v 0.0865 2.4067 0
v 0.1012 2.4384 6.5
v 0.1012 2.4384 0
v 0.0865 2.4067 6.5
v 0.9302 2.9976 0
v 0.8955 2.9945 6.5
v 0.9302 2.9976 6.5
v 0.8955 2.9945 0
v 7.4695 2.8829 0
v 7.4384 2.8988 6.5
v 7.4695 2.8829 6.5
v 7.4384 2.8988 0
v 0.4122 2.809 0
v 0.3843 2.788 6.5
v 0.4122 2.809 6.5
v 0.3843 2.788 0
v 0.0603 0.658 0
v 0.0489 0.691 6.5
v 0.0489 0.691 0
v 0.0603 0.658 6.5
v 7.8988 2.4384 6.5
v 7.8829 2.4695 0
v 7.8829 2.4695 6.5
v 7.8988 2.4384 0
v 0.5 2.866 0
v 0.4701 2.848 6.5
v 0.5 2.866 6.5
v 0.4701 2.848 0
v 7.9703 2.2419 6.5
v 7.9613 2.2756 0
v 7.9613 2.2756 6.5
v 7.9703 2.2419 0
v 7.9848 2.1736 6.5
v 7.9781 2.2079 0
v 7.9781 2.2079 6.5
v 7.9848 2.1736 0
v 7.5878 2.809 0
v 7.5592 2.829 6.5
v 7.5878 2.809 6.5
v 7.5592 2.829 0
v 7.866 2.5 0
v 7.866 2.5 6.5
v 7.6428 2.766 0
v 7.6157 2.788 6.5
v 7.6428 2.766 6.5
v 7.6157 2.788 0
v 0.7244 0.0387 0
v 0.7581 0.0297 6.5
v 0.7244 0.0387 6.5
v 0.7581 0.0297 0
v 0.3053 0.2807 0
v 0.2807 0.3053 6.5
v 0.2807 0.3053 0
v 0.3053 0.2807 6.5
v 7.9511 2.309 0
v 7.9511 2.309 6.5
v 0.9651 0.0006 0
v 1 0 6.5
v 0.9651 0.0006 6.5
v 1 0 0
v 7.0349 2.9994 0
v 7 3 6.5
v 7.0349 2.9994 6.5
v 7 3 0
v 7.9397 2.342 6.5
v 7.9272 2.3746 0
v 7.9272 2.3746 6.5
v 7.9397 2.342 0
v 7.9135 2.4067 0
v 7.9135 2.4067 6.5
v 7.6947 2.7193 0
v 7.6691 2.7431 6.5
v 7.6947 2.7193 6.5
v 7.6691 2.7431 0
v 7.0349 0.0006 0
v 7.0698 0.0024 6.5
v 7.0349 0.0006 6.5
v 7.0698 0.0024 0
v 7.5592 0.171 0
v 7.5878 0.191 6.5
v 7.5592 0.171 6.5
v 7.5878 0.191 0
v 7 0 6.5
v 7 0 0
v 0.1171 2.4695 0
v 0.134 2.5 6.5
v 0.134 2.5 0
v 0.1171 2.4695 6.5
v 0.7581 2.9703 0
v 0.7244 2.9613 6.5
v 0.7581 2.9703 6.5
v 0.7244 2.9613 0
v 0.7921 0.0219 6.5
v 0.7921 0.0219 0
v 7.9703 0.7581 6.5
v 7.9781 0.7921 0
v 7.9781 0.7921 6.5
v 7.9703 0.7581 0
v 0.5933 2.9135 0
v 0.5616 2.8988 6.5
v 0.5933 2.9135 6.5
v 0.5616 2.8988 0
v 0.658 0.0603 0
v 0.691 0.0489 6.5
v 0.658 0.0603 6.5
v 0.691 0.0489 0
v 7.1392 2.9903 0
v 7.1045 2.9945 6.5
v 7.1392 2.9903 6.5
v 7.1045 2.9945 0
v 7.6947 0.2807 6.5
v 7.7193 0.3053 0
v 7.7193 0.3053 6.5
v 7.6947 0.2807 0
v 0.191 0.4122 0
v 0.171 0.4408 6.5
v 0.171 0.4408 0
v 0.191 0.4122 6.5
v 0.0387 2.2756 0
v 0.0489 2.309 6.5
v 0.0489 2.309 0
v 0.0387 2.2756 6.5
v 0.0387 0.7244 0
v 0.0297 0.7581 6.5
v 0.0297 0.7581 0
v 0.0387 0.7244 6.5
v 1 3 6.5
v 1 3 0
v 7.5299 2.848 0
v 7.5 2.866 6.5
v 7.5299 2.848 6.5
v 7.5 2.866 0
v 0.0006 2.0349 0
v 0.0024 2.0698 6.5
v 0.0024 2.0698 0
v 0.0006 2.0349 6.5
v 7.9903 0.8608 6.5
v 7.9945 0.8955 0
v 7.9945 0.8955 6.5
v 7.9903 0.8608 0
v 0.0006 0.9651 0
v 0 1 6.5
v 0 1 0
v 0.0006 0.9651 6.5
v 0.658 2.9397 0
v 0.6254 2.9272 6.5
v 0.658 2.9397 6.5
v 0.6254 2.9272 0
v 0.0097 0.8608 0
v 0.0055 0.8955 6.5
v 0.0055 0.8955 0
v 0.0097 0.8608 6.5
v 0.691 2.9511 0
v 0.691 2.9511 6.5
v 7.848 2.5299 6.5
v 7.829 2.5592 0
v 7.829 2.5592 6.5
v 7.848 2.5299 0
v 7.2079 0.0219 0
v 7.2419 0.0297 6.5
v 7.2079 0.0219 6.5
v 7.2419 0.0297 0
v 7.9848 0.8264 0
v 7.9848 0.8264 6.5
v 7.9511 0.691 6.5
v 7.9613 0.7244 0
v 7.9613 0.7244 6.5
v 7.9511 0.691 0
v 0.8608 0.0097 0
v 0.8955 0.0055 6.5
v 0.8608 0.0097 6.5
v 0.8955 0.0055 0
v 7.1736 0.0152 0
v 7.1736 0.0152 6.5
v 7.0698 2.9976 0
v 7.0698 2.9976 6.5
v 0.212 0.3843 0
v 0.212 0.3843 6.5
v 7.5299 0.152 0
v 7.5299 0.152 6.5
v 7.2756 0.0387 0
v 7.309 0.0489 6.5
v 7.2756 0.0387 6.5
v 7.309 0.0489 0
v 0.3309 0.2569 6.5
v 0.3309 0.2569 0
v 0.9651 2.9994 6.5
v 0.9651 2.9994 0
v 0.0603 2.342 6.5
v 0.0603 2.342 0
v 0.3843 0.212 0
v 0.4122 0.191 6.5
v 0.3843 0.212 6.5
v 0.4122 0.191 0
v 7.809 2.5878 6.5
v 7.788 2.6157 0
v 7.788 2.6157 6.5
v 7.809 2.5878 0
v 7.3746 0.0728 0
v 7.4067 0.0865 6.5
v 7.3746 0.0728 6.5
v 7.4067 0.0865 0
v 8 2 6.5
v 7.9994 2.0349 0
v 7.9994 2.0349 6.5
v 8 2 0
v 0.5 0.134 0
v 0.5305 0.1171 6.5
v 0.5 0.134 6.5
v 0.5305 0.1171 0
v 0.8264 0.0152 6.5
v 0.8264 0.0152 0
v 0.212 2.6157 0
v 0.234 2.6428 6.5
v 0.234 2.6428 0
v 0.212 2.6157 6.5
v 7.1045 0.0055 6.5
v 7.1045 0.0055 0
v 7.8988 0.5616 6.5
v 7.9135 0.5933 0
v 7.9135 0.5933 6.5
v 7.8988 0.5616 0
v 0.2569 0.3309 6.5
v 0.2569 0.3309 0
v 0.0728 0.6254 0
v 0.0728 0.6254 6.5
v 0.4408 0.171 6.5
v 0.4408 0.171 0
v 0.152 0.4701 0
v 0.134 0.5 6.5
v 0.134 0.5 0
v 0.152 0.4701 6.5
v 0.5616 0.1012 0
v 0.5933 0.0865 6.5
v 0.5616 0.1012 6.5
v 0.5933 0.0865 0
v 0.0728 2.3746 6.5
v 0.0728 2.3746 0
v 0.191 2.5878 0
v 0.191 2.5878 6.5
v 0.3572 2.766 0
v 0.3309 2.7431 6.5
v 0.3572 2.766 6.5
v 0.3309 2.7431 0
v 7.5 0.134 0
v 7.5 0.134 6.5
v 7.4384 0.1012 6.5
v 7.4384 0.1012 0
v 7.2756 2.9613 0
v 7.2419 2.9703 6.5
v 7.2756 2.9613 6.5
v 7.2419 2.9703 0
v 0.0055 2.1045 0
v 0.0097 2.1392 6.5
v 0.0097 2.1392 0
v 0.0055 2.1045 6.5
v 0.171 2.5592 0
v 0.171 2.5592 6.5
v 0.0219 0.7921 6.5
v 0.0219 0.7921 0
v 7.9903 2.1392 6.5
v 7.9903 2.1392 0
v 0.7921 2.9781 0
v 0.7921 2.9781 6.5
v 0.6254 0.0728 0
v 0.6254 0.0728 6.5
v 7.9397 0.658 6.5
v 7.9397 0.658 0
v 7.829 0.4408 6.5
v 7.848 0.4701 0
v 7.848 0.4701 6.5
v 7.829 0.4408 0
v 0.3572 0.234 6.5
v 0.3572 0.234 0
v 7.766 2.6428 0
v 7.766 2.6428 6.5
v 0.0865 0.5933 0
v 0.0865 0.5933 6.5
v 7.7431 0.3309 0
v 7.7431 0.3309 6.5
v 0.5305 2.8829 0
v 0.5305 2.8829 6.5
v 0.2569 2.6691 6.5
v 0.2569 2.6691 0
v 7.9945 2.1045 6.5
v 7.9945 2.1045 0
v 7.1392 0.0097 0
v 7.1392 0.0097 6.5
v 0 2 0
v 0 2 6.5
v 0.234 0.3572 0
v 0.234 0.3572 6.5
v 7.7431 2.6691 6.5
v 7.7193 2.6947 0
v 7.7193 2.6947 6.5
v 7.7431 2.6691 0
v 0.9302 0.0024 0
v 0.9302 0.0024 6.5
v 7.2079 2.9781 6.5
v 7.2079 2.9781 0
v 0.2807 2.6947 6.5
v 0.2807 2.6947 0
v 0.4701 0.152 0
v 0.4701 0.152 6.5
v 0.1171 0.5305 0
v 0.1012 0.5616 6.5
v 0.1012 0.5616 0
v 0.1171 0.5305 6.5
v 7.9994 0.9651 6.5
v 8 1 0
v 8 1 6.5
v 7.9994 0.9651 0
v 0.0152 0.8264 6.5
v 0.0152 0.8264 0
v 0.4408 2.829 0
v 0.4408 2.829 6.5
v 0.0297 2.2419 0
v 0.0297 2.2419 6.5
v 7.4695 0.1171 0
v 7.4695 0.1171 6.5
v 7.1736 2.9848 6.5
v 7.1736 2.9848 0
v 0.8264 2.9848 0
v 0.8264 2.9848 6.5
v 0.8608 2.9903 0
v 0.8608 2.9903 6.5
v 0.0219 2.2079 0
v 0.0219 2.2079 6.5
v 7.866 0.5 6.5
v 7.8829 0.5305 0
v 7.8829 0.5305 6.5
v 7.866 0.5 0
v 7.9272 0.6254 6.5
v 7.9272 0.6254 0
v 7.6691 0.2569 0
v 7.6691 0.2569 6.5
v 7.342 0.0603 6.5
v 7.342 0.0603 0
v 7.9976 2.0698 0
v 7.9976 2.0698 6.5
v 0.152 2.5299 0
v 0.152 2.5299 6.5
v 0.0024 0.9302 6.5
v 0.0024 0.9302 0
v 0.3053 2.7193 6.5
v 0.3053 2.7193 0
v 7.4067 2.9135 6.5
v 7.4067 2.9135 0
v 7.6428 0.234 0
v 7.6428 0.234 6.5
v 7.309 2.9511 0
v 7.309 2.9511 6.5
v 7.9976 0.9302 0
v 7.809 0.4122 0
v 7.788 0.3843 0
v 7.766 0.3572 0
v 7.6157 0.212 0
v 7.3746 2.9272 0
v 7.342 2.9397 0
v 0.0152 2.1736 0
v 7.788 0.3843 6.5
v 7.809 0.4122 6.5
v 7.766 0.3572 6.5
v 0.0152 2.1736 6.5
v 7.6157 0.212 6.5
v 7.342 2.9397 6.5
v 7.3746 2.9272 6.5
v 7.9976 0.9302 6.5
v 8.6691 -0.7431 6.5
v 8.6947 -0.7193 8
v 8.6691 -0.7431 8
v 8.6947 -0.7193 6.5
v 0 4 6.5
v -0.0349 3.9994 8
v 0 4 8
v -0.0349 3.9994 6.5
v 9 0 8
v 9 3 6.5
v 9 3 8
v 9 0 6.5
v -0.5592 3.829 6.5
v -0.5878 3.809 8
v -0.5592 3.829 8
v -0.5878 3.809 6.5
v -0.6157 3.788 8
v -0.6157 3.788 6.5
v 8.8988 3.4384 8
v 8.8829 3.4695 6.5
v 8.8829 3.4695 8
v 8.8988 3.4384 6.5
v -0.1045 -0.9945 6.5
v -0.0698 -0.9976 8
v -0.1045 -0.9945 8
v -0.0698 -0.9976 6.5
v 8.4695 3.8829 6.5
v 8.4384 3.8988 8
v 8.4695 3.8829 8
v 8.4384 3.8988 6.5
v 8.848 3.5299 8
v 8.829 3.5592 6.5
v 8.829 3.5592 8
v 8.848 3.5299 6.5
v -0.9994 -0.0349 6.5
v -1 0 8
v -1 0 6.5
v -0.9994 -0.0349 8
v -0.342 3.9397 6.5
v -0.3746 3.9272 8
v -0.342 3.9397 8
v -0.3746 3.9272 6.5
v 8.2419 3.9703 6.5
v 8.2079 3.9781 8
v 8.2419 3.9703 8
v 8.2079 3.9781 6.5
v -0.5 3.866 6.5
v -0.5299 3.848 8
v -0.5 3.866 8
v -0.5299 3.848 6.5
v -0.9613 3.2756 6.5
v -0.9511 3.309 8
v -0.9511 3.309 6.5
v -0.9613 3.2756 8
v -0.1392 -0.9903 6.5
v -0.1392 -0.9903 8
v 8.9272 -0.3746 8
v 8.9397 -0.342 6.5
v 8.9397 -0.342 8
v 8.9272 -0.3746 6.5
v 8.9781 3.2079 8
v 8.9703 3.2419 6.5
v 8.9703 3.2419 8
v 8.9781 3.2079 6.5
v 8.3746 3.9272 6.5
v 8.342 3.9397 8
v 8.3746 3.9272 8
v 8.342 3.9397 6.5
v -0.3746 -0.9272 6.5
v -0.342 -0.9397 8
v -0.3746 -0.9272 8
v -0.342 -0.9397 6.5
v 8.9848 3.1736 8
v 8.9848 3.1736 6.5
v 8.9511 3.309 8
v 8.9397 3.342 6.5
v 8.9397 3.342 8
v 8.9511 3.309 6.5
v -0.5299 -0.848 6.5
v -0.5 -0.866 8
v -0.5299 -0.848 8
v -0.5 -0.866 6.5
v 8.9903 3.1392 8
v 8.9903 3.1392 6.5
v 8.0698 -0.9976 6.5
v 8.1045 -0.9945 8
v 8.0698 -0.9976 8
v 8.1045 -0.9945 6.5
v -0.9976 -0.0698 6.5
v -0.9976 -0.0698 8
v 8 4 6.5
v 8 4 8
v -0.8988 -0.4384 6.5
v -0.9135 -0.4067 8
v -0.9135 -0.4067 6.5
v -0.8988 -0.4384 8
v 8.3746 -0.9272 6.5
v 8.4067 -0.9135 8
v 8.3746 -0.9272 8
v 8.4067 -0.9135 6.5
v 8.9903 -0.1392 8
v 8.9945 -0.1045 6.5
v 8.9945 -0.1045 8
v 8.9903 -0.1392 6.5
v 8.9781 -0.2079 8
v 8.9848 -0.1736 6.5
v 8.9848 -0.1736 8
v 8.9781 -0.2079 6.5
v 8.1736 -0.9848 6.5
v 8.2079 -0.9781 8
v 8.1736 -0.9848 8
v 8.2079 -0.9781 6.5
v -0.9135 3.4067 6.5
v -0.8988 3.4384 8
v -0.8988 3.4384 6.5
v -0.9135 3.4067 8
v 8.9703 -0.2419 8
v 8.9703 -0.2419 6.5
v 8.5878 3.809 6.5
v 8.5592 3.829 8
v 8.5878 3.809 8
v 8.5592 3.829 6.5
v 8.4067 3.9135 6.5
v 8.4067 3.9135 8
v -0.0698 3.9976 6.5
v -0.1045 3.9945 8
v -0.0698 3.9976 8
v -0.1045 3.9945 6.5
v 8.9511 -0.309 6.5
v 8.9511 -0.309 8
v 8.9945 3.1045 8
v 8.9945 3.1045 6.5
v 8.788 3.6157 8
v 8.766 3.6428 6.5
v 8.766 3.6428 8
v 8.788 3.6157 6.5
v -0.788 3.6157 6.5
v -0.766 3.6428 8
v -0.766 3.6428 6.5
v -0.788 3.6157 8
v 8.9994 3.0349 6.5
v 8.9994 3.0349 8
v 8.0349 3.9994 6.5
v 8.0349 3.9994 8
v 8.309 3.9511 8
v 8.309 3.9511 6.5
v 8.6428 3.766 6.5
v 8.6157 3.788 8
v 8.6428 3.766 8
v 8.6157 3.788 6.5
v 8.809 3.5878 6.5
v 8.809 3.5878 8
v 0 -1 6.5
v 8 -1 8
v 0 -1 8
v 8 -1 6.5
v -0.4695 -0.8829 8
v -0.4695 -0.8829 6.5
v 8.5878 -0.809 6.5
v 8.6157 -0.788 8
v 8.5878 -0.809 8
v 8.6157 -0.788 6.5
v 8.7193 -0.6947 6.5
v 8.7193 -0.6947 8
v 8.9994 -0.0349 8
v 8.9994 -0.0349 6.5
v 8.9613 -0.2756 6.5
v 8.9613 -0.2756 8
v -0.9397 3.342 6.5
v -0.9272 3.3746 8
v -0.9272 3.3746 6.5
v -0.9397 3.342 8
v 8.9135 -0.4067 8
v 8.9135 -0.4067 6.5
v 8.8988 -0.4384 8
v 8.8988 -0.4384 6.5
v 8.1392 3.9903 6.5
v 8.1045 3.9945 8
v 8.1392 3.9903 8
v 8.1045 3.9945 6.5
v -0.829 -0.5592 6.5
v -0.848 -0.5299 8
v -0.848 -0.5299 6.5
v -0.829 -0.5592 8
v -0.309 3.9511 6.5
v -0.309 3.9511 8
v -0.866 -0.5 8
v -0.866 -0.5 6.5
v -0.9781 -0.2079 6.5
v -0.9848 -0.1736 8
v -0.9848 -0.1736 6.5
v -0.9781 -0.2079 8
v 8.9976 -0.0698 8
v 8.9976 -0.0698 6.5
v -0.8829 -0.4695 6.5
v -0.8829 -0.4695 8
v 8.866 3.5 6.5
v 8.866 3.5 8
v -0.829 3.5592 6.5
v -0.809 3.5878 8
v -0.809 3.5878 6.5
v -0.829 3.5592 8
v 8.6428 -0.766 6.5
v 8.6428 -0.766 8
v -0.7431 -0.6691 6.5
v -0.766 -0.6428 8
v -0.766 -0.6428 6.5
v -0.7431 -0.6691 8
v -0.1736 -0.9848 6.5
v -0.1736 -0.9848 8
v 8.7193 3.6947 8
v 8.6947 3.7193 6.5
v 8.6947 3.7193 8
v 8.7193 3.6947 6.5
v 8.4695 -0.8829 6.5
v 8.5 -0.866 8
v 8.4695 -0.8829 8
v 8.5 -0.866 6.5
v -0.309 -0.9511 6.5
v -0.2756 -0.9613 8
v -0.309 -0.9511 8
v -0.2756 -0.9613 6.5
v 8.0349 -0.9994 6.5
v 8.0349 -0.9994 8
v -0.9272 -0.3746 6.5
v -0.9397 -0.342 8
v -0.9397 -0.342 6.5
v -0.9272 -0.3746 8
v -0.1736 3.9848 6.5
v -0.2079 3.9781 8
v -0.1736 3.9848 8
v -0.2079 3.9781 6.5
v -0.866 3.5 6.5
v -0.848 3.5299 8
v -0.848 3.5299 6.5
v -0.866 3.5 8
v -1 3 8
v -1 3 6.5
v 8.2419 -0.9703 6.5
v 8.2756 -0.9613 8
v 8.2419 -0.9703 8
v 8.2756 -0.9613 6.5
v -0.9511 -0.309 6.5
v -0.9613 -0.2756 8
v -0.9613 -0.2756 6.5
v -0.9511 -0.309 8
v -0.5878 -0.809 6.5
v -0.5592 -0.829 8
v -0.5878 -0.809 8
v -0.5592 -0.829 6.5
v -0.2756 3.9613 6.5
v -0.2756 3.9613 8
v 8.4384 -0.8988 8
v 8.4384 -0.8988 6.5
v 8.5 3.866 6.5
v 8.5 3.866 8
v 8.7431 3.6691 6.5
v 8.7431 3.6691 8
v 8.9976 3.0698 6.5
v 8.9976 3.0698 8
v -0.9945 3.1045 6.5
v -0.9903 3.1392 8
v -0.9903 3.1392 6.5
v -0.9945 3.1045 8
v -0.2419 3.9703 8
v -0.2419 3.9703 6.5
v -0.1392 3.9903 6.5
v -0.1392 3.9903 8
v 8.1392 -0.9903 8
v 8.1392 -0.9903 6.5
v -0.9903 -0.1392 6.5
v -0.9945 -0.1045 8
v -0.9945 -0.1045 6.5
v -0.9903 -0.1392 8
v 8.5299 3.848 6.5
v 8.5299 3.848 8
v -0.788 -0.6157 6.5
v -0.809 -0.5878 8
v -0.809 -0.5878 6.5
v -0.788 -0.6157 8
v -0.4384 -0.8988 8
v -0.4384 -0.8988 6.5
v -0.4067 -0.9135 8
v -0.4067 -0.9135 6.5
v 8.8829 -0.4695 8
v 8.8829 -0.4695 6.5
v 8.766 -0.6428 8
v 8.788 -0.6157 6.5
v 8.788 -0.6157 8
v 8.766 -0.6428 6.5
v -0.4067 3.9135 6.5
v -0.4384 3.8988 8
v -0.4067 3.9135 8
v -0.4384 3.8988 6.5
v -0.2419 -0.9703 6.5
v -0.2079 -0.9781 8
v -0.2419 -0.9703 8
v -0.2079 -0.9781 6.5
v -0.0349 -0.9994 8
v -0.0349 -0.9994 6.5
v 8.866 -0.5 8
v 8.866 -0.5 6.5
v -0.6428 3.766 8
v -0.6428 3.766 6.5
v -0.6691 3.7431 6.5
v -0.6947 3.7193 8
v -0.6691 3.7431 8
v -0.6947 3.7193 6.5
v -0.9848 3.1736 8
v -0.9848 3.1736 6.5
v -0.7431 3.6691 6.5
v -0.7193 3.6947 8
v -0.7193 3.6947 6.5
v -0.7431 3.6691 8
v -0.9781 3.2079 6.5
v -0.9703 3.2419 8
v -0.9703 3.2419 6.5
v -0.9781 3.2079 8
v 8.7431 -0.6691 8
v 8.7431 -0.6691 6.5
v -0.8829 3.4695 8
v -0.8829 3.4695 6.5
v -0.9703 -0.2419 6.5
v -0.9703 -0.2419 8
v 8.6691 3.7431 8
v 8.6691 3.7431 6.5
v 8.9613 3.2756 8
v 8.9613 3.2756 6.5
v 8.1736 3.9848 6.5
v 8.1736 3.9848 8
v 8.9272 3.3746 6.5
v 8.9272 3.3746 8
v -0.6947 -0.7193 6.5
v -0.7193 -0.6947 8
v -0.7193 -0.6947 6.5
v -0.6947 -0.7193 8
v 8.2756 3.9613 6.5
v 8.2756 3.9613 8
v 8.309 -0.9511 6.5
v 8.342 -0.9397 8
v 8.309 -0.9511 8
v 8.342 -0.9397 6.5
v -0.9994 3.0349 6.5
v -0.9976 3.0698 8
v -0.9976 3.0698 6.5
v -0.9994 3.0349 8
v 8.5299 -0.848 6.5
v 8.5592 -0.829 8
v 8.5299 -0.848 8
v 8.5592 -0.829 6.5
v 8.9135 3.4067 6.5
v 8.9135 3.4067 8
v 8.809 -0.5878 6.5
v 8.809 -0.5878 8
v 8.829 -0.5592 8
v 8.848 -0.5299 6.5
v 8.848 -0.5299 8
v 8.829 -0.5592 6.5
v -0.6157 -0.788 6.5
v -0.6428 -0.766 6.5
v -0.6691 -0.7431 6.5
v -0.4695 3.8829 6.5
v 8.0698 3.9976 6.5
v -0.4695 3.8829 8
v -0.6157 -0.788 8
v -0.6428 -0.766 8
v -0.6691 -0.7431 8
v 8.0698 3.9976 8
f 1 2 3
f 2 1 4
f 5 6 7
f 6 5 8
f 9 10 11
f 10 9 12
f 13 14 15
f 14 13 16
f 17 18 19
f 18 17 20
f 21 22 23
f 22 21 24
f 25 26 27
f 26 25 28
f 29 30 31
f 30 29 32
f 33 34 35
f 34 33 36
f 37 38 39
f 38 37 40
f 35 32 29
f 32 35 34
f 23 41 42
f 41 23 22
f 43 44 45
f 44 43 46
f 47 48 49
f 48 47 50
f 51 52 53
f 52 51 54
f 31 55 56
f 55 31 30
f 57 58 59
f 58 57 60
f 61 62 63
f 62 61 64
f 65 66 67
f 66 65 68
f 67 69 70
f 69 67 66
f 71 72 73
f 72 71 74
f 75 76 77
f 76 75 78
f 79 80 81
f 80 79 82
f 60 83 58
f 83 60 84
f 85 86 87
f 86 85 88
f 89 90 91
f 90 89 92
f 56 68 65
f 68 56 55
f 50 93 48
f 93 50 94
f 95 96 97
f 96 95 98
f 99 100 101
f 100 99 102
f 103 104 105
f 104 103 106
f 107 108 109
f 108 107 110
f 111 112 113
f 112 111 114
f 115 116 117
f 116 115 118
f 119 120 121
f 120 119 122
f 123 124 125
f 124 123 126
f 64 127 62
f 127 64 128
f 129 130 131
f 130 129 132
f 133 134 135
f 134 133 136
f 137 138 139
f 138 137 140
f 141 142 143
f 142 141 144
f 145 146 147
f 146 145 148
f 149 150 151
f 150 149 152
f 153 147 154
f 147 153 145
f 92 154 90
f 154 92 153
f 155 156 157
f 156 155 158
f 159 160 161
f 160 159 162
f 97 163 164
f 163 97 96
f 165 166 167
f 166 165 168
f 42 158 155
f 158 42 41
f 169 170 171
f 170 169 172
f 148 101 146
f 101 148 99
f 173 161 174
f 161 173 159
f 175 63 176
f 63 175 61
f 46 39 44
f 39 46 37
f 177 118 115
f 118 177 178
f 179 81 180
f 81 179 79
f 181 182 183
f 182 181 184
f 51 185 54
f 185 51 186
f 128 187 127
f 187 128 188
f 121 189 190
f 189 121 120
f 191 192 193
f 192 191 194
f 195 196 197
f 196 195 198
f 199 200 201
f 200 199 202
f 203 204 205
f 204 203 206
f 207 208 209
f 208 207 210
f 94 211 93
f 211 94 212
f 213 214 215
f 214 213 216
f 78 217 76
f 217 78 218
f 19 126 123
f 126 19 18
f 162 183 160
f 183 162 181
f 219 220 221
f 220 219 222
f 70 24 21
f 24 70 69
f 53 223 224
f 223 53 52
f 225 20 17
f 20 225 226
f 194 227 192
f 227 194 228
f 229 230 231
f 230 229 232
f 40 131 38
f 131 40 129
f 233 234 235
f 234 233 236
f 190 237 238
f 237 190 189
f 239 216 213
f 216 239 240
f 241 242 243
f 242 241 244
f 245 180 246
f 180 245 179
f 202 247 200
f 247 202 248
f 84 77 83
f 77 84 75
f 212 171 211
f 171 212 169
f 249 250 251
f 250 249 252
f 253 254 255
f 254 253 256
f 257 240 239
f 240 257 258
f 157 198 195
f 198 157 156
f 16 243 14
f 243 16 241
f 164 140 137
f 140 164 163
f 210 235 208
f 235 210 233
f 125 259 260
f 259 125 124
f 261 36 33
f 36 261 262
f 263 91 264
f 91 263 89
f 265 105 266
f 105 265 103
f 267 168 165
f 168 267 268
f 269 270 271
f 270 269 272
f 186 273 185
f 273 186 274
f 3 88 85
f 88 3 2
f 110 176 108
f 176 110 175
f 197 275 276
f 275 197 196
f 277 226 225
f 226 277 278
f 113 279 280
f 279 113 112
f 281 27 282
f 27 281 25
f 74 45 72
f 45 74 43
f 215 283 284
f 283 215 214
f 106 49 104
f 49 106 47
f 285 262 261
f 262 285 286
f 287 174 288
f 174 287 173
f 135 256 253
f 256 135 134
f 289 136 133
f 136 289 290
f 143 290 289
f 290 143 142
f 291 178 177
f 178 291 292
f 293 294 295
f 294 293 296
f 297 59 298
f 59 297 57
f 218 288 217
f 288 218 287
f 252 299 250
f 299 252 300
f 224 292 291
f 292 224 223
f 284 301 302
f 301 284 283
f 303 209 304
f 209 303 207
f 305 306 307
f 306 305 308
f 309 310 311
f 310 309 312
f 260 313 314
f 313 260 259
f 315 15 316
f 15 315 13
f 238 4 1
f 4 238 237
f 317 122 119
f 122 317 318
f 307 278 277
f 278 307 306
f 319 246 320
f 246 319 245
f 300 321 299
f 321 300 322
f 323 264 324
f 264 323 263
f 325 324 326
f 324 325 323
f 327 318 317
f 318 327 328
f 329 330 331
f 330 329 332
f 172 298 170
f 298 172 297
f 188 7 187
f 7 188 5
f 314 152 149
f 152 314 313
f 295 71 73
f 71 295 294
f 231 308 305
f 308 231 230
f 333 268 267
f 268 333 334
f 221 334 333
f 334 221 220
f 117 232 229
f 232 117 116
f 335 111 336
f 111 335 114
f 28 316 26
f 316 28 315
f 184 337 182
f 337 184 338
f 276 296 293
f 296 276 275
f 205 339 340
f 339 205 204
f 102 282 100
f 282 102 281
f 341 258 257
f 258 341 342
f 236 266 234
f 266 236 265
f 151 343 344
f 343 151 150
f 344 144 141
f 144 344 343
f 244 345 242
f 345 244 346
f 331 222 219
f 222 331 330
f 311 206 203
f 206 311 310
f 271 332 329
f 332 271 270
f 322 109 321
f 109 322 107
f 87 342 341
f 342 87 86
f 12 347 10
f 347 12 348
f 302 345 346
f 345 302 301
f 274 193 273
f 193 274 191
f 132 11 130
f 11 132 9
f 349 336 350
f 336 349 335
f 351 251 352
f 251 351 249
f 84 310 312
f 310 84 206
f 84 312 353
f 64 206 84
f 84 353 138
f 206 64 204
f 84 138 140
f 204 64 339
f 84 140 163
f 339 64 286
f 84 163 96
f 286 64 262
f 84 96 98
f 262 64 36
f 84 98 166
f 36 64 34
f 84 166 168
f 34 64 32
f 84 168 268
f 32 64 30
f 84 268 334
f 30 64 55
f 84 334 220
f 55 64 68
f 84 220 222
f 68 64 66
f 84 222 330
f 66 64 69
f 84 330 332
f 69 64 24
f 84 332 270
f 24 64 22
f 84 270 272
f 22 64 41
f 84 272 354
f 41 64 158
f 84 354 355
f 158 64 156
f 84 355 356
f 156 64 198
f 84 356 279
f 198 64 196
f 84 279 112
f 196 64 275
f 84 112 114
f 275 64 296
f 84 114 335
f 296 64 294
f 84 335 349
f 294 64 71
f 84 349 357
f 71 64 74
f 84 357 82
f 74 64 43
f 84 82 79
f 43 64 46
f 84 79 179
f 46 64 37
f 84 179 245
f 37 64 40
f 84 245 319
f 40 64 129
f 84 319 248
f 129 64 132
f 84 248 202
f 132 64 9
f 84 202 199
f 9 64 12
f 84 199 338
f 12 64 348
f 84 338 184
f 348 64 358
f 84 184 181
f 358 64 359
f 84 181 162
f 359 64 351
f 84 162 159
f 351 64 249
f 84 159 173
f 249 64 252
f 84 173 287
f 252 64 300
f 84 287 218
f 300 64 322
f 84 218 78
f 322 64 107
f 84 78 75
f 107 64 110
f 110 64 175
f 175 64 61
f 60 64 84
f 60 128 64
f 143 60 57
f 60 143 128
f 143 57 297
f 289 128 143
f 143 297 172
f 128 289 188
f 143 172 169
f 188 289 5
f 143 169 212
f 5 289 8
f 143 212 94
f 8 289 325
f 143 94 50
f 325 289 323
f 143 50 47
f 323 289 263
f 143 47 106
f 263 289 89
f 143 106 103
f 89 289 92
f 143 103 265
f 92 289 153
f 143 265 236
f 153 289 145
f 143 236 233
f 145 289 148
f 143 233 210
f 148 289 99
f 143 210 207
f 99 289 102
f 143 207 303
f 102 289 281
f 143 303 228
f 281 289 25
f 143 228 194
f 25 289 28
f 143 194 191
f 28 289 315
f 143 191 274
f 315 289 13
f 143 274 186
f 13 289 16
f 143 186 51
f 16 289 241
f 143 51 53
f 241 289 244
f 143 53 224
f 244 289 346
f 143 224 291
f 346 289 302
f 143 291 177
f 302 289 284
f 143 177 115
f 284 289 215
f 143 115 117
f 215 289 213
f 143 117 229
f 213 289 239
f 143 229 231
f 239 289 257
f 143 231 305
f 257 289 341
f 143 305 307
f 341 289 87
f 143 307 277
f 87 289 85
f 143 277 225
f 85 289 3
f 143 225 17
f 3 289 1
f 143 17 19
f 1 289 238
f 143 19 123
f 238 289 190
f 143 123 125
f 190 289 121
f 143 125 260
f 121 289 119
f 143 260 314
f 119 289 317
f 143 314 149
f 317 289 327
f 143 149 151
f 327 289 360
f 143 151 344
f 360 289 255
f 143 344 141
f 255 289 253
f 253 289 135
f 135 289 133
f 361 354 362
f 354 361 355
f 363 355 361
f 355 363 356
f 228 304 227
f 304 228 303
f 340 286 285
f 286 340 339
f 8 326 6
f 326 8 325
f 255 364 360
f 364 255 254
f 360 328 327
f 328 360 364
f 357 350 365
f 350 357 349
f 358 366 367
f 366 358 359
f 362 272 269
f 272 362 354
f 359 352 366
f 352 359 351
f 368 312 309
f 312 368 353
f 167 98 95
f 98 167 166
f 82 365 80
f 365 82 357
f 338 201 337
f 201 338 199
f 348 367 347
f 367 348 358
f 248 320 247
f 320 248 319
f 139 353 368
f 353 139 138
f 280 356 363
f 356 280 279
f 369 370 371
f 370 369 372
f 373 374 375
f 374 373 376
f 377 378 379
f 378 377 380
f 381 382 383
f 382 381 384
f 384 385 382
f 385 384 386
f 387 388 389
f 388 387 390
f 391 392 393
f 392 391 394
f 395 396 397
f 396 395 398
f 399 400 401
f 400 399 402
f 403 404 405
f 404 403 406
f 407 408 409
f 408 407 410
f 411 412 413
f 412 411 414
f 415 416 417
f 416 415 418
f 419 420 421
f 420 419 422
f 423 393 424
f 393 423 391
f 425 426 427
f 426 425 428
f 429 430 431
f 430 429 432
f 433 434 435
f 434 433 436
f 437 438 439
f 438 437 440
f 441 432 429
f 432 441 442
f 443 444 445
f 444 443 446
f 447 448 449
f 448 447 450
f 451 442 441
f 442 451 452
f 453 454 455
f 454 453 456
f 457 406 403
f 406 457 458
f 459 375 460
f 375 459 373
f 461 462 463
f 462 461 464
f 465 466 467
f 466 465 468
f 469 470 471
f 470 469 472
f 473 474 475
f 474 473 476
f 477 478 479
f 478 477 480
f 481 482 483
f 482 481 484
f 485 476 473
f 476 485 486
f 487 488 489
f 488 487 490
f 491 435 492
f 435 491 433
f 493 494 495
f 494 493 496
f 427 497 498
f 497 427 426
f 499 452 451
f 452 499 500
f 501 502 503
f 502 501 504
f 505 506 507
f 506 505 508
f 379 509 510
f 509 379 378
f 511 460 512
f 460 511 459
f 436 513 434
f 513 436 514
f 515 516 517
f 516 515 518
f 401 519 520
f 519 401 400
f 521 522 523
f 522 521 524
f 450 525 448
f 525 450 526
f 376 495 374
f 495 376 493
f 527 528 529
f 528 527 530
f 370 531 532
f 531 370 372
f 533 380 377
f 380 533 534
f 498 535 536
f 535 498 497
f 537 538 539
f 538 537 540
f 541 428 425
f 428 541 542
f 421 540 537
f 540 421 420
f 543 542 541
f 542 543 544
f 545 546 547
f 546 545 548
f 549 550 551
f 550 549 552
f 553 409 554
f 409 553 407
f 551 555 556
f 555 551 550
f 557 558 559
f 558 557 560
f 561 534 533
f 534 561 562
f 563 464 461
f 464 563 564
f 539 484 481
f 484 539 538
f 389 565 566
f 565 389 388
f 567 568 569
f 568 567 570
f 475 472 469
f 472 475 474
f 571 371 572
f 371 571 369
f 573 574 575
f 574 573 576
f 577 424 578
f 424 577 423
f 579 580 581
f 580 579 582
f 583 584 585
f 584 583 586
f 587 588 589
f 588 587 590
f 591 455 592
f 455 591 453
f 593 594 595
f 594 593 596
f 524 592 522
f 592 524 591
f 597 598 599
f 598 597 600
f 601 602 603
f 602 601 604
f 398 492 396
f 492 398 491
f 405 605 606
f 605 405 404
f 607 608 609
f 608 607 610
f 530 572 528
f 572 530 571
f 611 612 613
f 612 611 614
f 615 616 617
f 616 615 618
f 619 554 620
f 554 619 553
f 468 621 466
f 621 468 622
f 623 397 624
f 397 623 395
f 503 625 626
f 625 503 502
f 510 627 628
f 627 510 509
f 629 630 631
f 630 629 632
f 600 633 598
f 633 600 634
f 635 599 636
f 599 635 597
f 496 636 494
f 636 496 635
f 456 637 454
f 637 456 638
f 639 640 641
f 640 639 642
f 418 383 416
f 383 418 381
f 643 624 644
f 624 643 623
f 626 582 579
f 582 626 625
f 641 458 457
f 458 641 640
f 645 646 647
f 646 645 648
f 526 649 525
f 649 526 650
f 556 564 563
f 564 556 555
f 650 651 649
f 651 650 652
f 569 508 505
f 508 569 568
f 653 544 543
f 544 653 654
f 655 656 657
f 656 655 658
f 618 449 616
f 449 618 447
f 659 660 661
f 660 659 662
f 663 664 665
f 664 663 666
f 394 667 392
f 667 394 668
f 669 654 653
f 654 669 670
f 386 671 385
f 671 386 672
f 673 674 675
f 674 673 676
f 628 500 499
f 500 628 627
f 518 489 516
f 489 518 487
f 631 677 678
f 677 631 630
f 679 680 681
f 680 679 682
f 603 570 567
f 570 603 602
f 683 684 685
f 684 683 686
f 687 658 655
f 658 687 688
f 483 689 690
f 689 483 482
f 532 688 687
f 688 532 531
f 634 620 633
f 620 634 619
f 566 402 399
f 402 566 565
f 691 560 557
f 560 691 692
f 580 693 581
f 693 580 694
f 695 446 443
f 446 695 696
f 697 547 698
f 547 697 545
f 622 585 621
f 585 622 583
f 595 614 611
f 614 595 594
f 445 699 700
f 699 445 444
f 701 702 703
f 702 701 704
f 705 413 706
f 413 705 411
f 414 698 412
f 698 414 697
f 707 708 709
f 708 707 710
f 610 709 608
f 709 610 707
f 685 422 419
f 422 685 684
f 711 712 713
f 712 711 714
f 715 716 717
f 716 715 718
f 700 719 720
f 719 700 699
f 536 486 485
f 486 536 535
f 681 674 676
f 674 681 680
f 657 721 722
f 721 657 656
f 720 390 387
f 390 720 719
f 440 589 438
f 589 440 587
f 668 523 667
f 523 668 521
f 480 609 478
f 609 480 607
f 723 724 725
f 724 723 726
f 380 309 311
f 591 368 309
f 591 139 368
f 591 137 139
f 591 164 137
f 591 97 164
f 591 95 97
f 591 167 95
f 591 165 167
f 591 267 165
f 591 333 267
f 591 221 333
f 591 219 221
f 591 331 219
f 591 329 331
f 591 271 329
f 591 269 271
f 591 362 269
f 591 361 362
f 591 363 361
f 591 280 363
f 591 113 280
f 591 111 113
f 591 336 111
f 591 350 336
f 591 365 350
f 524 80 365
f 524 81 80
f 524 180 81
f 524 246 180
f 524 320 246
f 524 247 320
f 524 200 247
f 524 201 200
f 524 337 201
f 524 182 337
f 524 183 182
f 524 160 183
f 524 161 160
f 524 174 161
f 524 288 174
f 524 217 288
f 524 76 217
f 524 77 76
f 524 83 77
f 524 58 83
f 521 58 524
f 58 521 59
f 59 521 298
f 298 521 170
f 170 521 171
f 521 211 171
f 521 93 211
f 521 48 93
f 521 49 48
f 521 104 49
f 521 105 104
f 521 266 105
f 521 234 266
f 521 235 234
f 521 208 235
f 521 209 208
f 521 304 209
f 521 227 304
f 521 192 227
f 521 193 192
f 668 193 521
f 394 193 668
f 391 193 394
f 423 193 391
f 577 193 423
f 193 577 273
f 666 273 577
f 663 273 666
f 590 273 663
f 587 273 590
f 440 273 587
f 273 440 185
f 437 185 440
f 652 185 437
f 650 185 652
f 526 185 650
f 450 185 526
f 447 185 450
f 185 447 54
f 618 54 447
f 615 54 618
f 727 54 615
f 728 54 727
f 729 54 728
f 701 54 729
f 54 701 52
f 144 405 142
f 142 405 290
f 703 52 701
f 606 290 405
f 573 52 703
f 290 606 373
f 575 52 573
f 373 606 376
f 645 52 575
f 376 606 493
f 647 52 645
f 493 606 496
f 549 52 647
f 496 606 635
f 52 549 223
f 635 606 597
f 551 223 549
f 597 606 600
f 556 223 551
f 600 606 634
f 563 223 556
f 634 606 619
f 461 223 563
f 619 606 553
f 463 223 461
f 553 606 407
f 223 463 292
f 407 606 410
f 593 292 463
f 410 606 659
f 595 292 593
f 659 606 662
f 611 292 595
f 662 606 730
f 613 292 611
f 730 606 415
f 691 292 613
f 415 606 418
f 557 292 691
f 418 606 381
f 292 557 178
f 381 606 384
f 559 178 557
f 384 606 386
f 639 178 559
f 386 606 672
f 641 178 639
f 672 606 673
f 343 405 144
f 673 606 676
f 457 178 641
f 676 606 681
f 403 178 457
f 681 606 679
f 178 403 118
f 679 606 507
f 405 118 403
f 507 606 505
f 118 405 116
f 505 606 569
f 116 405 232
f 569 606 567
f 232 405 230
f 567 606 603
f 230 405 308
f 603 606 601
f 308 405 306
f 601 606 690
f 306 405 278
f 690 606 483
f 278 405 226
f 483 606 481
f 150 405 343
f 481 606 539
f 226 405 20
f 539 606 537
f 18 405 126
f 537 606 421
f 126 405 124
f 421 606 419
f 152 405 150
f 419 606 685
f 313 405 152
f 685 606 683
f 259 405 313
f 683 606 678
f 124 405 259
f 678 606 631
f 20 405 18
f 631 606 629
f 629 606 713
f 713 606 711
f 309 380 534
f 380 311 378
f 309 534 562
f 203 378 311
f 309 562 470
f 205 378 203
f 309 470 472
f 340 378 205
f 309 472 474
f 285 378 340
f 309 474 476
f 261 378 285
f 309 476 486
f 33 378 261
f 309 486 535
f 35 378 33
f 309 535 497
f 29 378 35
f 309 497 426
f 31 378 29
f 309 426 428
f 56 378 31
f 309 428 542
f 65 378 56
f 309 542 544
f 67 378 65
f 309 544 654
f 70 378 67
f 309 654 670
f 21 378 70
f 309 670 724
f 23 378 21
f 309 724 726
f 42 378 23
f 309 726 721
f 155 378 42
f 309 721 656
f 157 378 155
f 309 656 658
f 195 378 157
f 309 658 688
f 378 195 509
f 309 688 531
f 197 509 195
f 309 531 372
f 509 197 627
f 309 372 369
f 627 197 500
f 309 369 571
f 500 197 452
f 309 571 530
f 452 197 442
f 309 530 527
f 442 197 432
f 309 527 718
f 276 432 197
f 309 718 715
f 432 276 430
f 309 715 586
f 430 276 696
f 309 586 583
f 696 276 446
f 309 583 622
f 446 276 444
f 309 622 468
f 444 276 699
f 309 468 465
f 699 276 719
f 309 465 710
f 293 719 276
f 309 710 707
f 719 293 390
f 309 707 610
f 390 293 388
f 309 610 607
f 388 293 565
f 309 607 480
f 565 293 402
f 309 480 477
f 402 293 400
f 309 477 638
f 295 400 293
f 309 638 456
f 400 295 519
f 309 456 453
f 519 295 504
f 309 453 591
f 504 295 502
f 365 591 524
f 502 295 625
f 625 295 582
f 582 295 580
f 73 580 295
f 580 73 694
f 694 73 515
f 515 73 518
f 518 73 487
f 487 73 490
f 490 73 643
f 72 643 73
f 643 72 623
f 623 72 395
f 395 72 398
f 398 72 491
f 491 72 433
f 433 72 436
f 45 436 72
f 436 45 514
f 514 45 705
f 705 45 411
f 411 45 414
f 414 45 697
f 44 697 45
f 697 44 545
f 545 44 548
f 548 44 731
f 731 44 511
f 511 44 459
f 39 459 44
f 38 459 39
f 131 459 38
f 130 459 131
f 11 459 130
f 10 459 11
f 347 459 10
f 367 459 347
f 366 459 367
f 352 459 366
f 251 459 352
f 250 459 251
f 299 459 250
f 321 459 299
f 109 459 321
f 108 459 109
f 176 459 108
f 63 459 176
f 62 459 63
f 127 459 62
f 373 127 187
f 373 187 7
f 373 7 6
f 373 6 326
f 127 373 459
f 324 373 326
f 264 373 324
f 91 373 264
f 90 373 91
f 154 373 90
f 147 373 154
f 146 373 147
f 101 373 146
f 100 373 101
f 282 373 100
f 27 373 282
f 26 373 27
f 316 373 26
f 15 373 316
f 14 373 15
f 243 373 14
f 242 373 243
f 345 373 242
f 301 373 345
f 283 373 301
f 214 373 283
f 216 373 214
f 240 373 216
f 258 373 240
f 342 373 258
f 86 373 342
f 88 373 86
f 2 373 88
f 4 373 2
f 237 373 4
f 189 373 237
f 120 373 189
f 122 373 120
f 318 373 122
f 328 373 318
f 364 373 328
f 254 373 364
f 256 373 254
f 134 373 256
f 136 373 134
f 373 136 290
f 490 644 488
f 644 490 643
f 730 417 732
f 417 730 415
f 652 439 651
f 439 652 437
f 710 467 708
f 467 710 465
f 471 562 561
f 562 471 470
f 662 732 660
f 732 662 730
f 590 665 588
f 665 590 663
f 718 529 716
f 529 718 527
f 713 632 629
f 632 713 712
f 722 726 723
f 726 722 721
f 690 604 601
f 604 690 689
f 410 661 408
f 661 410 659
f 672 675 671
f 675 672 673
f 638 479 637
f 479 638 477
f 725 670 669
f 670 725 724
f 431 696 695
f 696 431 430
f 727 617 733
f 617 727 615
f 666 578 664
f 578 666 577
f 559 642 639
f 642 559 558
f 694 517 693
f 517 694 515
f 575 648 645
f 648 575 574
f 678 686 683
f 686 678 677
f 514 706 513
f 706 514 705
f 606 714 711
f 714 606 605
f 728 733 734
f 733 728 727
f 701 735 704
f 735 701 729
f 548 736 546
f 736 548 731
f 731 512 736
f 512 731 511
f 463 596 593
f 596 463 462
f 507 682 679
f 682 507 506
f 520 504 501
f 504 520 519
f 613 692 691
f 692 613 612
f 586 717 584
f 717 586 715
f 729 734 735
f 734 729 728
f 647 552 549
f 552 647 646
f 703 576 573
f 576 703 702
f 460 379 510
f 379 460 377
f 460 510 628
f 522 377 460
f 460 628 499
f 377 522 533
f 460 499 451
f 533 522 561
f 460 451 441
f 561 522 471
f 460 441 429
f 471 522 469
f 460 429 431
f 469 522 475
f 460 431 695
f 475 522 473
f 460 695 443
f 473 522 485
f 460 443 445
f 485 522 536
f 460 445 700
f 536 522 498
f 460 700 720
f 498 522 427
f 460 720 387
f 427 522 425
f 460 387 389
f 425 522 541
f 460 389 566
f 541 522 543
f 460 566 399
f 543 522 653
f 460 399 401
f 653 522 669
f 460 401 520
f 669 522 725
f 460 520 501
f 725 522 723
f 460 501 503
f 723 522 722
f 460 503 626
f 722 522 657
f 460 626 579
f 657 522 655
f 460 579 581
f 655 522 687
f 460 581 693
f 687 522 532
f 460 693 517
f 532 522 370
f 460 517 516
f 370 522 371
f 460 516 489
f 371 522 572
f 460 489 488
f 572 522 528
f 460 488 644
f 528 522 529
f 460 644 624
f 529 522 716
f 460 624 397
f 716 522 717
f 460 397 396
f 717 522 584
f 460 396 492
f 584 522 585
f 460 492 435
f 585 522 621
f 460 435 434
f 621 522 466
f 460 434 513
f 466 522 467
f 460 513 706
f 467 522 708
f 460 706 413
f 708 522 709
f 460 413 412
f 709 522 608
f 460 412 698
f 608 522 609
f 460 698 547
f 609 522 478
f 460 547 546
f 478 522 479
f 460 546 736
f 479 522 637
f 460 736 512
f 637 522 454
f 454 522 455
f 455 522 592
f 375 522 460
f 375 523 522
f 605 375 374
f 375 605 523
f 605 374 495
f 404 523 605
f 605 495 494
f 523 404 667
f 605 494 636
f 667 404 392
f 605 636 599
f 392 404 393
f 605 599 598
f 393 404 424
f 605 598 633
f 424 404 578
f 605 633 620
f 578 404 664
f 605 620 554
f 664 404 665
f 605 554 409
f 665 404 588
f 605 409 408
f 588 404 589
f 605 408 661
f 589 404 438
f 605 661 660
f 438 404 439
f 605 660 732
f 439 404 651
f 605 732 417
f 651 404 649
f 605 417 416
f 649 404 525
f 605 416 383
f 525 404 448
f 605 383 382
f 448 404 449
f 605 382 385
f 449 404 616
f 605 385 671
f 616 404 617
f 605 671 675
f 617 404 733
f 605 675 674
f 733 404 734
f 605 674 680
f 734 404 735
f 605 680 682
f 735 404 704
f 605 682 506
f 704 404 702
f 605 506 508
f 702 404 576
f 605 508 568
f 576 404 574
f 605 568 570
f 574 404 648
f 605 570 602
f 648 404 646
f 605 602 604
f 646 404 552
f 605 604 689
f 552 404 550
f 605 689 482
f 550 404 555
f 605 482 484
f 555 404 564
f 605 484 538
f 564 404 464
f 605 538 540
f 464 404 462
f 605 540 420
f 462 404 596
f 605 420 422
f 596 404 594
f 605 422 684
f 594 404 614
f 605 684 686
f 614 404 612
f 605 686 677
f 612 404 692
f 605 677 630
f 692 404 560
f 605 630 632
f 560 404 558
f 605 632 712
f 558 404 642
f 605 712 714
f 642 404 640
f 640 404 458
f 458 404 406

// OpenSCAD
// basic parameters
$fn=180;

translate([1,1,0])
    minkowski()
    {
        cube([6,1,6]);
        cylinder();
    }

translate([0,0,6.5])
    minkowski()
{
        cube([8,3,0.5]);
        cylinder();
    }
    
 //% cube([8,3,7]);
